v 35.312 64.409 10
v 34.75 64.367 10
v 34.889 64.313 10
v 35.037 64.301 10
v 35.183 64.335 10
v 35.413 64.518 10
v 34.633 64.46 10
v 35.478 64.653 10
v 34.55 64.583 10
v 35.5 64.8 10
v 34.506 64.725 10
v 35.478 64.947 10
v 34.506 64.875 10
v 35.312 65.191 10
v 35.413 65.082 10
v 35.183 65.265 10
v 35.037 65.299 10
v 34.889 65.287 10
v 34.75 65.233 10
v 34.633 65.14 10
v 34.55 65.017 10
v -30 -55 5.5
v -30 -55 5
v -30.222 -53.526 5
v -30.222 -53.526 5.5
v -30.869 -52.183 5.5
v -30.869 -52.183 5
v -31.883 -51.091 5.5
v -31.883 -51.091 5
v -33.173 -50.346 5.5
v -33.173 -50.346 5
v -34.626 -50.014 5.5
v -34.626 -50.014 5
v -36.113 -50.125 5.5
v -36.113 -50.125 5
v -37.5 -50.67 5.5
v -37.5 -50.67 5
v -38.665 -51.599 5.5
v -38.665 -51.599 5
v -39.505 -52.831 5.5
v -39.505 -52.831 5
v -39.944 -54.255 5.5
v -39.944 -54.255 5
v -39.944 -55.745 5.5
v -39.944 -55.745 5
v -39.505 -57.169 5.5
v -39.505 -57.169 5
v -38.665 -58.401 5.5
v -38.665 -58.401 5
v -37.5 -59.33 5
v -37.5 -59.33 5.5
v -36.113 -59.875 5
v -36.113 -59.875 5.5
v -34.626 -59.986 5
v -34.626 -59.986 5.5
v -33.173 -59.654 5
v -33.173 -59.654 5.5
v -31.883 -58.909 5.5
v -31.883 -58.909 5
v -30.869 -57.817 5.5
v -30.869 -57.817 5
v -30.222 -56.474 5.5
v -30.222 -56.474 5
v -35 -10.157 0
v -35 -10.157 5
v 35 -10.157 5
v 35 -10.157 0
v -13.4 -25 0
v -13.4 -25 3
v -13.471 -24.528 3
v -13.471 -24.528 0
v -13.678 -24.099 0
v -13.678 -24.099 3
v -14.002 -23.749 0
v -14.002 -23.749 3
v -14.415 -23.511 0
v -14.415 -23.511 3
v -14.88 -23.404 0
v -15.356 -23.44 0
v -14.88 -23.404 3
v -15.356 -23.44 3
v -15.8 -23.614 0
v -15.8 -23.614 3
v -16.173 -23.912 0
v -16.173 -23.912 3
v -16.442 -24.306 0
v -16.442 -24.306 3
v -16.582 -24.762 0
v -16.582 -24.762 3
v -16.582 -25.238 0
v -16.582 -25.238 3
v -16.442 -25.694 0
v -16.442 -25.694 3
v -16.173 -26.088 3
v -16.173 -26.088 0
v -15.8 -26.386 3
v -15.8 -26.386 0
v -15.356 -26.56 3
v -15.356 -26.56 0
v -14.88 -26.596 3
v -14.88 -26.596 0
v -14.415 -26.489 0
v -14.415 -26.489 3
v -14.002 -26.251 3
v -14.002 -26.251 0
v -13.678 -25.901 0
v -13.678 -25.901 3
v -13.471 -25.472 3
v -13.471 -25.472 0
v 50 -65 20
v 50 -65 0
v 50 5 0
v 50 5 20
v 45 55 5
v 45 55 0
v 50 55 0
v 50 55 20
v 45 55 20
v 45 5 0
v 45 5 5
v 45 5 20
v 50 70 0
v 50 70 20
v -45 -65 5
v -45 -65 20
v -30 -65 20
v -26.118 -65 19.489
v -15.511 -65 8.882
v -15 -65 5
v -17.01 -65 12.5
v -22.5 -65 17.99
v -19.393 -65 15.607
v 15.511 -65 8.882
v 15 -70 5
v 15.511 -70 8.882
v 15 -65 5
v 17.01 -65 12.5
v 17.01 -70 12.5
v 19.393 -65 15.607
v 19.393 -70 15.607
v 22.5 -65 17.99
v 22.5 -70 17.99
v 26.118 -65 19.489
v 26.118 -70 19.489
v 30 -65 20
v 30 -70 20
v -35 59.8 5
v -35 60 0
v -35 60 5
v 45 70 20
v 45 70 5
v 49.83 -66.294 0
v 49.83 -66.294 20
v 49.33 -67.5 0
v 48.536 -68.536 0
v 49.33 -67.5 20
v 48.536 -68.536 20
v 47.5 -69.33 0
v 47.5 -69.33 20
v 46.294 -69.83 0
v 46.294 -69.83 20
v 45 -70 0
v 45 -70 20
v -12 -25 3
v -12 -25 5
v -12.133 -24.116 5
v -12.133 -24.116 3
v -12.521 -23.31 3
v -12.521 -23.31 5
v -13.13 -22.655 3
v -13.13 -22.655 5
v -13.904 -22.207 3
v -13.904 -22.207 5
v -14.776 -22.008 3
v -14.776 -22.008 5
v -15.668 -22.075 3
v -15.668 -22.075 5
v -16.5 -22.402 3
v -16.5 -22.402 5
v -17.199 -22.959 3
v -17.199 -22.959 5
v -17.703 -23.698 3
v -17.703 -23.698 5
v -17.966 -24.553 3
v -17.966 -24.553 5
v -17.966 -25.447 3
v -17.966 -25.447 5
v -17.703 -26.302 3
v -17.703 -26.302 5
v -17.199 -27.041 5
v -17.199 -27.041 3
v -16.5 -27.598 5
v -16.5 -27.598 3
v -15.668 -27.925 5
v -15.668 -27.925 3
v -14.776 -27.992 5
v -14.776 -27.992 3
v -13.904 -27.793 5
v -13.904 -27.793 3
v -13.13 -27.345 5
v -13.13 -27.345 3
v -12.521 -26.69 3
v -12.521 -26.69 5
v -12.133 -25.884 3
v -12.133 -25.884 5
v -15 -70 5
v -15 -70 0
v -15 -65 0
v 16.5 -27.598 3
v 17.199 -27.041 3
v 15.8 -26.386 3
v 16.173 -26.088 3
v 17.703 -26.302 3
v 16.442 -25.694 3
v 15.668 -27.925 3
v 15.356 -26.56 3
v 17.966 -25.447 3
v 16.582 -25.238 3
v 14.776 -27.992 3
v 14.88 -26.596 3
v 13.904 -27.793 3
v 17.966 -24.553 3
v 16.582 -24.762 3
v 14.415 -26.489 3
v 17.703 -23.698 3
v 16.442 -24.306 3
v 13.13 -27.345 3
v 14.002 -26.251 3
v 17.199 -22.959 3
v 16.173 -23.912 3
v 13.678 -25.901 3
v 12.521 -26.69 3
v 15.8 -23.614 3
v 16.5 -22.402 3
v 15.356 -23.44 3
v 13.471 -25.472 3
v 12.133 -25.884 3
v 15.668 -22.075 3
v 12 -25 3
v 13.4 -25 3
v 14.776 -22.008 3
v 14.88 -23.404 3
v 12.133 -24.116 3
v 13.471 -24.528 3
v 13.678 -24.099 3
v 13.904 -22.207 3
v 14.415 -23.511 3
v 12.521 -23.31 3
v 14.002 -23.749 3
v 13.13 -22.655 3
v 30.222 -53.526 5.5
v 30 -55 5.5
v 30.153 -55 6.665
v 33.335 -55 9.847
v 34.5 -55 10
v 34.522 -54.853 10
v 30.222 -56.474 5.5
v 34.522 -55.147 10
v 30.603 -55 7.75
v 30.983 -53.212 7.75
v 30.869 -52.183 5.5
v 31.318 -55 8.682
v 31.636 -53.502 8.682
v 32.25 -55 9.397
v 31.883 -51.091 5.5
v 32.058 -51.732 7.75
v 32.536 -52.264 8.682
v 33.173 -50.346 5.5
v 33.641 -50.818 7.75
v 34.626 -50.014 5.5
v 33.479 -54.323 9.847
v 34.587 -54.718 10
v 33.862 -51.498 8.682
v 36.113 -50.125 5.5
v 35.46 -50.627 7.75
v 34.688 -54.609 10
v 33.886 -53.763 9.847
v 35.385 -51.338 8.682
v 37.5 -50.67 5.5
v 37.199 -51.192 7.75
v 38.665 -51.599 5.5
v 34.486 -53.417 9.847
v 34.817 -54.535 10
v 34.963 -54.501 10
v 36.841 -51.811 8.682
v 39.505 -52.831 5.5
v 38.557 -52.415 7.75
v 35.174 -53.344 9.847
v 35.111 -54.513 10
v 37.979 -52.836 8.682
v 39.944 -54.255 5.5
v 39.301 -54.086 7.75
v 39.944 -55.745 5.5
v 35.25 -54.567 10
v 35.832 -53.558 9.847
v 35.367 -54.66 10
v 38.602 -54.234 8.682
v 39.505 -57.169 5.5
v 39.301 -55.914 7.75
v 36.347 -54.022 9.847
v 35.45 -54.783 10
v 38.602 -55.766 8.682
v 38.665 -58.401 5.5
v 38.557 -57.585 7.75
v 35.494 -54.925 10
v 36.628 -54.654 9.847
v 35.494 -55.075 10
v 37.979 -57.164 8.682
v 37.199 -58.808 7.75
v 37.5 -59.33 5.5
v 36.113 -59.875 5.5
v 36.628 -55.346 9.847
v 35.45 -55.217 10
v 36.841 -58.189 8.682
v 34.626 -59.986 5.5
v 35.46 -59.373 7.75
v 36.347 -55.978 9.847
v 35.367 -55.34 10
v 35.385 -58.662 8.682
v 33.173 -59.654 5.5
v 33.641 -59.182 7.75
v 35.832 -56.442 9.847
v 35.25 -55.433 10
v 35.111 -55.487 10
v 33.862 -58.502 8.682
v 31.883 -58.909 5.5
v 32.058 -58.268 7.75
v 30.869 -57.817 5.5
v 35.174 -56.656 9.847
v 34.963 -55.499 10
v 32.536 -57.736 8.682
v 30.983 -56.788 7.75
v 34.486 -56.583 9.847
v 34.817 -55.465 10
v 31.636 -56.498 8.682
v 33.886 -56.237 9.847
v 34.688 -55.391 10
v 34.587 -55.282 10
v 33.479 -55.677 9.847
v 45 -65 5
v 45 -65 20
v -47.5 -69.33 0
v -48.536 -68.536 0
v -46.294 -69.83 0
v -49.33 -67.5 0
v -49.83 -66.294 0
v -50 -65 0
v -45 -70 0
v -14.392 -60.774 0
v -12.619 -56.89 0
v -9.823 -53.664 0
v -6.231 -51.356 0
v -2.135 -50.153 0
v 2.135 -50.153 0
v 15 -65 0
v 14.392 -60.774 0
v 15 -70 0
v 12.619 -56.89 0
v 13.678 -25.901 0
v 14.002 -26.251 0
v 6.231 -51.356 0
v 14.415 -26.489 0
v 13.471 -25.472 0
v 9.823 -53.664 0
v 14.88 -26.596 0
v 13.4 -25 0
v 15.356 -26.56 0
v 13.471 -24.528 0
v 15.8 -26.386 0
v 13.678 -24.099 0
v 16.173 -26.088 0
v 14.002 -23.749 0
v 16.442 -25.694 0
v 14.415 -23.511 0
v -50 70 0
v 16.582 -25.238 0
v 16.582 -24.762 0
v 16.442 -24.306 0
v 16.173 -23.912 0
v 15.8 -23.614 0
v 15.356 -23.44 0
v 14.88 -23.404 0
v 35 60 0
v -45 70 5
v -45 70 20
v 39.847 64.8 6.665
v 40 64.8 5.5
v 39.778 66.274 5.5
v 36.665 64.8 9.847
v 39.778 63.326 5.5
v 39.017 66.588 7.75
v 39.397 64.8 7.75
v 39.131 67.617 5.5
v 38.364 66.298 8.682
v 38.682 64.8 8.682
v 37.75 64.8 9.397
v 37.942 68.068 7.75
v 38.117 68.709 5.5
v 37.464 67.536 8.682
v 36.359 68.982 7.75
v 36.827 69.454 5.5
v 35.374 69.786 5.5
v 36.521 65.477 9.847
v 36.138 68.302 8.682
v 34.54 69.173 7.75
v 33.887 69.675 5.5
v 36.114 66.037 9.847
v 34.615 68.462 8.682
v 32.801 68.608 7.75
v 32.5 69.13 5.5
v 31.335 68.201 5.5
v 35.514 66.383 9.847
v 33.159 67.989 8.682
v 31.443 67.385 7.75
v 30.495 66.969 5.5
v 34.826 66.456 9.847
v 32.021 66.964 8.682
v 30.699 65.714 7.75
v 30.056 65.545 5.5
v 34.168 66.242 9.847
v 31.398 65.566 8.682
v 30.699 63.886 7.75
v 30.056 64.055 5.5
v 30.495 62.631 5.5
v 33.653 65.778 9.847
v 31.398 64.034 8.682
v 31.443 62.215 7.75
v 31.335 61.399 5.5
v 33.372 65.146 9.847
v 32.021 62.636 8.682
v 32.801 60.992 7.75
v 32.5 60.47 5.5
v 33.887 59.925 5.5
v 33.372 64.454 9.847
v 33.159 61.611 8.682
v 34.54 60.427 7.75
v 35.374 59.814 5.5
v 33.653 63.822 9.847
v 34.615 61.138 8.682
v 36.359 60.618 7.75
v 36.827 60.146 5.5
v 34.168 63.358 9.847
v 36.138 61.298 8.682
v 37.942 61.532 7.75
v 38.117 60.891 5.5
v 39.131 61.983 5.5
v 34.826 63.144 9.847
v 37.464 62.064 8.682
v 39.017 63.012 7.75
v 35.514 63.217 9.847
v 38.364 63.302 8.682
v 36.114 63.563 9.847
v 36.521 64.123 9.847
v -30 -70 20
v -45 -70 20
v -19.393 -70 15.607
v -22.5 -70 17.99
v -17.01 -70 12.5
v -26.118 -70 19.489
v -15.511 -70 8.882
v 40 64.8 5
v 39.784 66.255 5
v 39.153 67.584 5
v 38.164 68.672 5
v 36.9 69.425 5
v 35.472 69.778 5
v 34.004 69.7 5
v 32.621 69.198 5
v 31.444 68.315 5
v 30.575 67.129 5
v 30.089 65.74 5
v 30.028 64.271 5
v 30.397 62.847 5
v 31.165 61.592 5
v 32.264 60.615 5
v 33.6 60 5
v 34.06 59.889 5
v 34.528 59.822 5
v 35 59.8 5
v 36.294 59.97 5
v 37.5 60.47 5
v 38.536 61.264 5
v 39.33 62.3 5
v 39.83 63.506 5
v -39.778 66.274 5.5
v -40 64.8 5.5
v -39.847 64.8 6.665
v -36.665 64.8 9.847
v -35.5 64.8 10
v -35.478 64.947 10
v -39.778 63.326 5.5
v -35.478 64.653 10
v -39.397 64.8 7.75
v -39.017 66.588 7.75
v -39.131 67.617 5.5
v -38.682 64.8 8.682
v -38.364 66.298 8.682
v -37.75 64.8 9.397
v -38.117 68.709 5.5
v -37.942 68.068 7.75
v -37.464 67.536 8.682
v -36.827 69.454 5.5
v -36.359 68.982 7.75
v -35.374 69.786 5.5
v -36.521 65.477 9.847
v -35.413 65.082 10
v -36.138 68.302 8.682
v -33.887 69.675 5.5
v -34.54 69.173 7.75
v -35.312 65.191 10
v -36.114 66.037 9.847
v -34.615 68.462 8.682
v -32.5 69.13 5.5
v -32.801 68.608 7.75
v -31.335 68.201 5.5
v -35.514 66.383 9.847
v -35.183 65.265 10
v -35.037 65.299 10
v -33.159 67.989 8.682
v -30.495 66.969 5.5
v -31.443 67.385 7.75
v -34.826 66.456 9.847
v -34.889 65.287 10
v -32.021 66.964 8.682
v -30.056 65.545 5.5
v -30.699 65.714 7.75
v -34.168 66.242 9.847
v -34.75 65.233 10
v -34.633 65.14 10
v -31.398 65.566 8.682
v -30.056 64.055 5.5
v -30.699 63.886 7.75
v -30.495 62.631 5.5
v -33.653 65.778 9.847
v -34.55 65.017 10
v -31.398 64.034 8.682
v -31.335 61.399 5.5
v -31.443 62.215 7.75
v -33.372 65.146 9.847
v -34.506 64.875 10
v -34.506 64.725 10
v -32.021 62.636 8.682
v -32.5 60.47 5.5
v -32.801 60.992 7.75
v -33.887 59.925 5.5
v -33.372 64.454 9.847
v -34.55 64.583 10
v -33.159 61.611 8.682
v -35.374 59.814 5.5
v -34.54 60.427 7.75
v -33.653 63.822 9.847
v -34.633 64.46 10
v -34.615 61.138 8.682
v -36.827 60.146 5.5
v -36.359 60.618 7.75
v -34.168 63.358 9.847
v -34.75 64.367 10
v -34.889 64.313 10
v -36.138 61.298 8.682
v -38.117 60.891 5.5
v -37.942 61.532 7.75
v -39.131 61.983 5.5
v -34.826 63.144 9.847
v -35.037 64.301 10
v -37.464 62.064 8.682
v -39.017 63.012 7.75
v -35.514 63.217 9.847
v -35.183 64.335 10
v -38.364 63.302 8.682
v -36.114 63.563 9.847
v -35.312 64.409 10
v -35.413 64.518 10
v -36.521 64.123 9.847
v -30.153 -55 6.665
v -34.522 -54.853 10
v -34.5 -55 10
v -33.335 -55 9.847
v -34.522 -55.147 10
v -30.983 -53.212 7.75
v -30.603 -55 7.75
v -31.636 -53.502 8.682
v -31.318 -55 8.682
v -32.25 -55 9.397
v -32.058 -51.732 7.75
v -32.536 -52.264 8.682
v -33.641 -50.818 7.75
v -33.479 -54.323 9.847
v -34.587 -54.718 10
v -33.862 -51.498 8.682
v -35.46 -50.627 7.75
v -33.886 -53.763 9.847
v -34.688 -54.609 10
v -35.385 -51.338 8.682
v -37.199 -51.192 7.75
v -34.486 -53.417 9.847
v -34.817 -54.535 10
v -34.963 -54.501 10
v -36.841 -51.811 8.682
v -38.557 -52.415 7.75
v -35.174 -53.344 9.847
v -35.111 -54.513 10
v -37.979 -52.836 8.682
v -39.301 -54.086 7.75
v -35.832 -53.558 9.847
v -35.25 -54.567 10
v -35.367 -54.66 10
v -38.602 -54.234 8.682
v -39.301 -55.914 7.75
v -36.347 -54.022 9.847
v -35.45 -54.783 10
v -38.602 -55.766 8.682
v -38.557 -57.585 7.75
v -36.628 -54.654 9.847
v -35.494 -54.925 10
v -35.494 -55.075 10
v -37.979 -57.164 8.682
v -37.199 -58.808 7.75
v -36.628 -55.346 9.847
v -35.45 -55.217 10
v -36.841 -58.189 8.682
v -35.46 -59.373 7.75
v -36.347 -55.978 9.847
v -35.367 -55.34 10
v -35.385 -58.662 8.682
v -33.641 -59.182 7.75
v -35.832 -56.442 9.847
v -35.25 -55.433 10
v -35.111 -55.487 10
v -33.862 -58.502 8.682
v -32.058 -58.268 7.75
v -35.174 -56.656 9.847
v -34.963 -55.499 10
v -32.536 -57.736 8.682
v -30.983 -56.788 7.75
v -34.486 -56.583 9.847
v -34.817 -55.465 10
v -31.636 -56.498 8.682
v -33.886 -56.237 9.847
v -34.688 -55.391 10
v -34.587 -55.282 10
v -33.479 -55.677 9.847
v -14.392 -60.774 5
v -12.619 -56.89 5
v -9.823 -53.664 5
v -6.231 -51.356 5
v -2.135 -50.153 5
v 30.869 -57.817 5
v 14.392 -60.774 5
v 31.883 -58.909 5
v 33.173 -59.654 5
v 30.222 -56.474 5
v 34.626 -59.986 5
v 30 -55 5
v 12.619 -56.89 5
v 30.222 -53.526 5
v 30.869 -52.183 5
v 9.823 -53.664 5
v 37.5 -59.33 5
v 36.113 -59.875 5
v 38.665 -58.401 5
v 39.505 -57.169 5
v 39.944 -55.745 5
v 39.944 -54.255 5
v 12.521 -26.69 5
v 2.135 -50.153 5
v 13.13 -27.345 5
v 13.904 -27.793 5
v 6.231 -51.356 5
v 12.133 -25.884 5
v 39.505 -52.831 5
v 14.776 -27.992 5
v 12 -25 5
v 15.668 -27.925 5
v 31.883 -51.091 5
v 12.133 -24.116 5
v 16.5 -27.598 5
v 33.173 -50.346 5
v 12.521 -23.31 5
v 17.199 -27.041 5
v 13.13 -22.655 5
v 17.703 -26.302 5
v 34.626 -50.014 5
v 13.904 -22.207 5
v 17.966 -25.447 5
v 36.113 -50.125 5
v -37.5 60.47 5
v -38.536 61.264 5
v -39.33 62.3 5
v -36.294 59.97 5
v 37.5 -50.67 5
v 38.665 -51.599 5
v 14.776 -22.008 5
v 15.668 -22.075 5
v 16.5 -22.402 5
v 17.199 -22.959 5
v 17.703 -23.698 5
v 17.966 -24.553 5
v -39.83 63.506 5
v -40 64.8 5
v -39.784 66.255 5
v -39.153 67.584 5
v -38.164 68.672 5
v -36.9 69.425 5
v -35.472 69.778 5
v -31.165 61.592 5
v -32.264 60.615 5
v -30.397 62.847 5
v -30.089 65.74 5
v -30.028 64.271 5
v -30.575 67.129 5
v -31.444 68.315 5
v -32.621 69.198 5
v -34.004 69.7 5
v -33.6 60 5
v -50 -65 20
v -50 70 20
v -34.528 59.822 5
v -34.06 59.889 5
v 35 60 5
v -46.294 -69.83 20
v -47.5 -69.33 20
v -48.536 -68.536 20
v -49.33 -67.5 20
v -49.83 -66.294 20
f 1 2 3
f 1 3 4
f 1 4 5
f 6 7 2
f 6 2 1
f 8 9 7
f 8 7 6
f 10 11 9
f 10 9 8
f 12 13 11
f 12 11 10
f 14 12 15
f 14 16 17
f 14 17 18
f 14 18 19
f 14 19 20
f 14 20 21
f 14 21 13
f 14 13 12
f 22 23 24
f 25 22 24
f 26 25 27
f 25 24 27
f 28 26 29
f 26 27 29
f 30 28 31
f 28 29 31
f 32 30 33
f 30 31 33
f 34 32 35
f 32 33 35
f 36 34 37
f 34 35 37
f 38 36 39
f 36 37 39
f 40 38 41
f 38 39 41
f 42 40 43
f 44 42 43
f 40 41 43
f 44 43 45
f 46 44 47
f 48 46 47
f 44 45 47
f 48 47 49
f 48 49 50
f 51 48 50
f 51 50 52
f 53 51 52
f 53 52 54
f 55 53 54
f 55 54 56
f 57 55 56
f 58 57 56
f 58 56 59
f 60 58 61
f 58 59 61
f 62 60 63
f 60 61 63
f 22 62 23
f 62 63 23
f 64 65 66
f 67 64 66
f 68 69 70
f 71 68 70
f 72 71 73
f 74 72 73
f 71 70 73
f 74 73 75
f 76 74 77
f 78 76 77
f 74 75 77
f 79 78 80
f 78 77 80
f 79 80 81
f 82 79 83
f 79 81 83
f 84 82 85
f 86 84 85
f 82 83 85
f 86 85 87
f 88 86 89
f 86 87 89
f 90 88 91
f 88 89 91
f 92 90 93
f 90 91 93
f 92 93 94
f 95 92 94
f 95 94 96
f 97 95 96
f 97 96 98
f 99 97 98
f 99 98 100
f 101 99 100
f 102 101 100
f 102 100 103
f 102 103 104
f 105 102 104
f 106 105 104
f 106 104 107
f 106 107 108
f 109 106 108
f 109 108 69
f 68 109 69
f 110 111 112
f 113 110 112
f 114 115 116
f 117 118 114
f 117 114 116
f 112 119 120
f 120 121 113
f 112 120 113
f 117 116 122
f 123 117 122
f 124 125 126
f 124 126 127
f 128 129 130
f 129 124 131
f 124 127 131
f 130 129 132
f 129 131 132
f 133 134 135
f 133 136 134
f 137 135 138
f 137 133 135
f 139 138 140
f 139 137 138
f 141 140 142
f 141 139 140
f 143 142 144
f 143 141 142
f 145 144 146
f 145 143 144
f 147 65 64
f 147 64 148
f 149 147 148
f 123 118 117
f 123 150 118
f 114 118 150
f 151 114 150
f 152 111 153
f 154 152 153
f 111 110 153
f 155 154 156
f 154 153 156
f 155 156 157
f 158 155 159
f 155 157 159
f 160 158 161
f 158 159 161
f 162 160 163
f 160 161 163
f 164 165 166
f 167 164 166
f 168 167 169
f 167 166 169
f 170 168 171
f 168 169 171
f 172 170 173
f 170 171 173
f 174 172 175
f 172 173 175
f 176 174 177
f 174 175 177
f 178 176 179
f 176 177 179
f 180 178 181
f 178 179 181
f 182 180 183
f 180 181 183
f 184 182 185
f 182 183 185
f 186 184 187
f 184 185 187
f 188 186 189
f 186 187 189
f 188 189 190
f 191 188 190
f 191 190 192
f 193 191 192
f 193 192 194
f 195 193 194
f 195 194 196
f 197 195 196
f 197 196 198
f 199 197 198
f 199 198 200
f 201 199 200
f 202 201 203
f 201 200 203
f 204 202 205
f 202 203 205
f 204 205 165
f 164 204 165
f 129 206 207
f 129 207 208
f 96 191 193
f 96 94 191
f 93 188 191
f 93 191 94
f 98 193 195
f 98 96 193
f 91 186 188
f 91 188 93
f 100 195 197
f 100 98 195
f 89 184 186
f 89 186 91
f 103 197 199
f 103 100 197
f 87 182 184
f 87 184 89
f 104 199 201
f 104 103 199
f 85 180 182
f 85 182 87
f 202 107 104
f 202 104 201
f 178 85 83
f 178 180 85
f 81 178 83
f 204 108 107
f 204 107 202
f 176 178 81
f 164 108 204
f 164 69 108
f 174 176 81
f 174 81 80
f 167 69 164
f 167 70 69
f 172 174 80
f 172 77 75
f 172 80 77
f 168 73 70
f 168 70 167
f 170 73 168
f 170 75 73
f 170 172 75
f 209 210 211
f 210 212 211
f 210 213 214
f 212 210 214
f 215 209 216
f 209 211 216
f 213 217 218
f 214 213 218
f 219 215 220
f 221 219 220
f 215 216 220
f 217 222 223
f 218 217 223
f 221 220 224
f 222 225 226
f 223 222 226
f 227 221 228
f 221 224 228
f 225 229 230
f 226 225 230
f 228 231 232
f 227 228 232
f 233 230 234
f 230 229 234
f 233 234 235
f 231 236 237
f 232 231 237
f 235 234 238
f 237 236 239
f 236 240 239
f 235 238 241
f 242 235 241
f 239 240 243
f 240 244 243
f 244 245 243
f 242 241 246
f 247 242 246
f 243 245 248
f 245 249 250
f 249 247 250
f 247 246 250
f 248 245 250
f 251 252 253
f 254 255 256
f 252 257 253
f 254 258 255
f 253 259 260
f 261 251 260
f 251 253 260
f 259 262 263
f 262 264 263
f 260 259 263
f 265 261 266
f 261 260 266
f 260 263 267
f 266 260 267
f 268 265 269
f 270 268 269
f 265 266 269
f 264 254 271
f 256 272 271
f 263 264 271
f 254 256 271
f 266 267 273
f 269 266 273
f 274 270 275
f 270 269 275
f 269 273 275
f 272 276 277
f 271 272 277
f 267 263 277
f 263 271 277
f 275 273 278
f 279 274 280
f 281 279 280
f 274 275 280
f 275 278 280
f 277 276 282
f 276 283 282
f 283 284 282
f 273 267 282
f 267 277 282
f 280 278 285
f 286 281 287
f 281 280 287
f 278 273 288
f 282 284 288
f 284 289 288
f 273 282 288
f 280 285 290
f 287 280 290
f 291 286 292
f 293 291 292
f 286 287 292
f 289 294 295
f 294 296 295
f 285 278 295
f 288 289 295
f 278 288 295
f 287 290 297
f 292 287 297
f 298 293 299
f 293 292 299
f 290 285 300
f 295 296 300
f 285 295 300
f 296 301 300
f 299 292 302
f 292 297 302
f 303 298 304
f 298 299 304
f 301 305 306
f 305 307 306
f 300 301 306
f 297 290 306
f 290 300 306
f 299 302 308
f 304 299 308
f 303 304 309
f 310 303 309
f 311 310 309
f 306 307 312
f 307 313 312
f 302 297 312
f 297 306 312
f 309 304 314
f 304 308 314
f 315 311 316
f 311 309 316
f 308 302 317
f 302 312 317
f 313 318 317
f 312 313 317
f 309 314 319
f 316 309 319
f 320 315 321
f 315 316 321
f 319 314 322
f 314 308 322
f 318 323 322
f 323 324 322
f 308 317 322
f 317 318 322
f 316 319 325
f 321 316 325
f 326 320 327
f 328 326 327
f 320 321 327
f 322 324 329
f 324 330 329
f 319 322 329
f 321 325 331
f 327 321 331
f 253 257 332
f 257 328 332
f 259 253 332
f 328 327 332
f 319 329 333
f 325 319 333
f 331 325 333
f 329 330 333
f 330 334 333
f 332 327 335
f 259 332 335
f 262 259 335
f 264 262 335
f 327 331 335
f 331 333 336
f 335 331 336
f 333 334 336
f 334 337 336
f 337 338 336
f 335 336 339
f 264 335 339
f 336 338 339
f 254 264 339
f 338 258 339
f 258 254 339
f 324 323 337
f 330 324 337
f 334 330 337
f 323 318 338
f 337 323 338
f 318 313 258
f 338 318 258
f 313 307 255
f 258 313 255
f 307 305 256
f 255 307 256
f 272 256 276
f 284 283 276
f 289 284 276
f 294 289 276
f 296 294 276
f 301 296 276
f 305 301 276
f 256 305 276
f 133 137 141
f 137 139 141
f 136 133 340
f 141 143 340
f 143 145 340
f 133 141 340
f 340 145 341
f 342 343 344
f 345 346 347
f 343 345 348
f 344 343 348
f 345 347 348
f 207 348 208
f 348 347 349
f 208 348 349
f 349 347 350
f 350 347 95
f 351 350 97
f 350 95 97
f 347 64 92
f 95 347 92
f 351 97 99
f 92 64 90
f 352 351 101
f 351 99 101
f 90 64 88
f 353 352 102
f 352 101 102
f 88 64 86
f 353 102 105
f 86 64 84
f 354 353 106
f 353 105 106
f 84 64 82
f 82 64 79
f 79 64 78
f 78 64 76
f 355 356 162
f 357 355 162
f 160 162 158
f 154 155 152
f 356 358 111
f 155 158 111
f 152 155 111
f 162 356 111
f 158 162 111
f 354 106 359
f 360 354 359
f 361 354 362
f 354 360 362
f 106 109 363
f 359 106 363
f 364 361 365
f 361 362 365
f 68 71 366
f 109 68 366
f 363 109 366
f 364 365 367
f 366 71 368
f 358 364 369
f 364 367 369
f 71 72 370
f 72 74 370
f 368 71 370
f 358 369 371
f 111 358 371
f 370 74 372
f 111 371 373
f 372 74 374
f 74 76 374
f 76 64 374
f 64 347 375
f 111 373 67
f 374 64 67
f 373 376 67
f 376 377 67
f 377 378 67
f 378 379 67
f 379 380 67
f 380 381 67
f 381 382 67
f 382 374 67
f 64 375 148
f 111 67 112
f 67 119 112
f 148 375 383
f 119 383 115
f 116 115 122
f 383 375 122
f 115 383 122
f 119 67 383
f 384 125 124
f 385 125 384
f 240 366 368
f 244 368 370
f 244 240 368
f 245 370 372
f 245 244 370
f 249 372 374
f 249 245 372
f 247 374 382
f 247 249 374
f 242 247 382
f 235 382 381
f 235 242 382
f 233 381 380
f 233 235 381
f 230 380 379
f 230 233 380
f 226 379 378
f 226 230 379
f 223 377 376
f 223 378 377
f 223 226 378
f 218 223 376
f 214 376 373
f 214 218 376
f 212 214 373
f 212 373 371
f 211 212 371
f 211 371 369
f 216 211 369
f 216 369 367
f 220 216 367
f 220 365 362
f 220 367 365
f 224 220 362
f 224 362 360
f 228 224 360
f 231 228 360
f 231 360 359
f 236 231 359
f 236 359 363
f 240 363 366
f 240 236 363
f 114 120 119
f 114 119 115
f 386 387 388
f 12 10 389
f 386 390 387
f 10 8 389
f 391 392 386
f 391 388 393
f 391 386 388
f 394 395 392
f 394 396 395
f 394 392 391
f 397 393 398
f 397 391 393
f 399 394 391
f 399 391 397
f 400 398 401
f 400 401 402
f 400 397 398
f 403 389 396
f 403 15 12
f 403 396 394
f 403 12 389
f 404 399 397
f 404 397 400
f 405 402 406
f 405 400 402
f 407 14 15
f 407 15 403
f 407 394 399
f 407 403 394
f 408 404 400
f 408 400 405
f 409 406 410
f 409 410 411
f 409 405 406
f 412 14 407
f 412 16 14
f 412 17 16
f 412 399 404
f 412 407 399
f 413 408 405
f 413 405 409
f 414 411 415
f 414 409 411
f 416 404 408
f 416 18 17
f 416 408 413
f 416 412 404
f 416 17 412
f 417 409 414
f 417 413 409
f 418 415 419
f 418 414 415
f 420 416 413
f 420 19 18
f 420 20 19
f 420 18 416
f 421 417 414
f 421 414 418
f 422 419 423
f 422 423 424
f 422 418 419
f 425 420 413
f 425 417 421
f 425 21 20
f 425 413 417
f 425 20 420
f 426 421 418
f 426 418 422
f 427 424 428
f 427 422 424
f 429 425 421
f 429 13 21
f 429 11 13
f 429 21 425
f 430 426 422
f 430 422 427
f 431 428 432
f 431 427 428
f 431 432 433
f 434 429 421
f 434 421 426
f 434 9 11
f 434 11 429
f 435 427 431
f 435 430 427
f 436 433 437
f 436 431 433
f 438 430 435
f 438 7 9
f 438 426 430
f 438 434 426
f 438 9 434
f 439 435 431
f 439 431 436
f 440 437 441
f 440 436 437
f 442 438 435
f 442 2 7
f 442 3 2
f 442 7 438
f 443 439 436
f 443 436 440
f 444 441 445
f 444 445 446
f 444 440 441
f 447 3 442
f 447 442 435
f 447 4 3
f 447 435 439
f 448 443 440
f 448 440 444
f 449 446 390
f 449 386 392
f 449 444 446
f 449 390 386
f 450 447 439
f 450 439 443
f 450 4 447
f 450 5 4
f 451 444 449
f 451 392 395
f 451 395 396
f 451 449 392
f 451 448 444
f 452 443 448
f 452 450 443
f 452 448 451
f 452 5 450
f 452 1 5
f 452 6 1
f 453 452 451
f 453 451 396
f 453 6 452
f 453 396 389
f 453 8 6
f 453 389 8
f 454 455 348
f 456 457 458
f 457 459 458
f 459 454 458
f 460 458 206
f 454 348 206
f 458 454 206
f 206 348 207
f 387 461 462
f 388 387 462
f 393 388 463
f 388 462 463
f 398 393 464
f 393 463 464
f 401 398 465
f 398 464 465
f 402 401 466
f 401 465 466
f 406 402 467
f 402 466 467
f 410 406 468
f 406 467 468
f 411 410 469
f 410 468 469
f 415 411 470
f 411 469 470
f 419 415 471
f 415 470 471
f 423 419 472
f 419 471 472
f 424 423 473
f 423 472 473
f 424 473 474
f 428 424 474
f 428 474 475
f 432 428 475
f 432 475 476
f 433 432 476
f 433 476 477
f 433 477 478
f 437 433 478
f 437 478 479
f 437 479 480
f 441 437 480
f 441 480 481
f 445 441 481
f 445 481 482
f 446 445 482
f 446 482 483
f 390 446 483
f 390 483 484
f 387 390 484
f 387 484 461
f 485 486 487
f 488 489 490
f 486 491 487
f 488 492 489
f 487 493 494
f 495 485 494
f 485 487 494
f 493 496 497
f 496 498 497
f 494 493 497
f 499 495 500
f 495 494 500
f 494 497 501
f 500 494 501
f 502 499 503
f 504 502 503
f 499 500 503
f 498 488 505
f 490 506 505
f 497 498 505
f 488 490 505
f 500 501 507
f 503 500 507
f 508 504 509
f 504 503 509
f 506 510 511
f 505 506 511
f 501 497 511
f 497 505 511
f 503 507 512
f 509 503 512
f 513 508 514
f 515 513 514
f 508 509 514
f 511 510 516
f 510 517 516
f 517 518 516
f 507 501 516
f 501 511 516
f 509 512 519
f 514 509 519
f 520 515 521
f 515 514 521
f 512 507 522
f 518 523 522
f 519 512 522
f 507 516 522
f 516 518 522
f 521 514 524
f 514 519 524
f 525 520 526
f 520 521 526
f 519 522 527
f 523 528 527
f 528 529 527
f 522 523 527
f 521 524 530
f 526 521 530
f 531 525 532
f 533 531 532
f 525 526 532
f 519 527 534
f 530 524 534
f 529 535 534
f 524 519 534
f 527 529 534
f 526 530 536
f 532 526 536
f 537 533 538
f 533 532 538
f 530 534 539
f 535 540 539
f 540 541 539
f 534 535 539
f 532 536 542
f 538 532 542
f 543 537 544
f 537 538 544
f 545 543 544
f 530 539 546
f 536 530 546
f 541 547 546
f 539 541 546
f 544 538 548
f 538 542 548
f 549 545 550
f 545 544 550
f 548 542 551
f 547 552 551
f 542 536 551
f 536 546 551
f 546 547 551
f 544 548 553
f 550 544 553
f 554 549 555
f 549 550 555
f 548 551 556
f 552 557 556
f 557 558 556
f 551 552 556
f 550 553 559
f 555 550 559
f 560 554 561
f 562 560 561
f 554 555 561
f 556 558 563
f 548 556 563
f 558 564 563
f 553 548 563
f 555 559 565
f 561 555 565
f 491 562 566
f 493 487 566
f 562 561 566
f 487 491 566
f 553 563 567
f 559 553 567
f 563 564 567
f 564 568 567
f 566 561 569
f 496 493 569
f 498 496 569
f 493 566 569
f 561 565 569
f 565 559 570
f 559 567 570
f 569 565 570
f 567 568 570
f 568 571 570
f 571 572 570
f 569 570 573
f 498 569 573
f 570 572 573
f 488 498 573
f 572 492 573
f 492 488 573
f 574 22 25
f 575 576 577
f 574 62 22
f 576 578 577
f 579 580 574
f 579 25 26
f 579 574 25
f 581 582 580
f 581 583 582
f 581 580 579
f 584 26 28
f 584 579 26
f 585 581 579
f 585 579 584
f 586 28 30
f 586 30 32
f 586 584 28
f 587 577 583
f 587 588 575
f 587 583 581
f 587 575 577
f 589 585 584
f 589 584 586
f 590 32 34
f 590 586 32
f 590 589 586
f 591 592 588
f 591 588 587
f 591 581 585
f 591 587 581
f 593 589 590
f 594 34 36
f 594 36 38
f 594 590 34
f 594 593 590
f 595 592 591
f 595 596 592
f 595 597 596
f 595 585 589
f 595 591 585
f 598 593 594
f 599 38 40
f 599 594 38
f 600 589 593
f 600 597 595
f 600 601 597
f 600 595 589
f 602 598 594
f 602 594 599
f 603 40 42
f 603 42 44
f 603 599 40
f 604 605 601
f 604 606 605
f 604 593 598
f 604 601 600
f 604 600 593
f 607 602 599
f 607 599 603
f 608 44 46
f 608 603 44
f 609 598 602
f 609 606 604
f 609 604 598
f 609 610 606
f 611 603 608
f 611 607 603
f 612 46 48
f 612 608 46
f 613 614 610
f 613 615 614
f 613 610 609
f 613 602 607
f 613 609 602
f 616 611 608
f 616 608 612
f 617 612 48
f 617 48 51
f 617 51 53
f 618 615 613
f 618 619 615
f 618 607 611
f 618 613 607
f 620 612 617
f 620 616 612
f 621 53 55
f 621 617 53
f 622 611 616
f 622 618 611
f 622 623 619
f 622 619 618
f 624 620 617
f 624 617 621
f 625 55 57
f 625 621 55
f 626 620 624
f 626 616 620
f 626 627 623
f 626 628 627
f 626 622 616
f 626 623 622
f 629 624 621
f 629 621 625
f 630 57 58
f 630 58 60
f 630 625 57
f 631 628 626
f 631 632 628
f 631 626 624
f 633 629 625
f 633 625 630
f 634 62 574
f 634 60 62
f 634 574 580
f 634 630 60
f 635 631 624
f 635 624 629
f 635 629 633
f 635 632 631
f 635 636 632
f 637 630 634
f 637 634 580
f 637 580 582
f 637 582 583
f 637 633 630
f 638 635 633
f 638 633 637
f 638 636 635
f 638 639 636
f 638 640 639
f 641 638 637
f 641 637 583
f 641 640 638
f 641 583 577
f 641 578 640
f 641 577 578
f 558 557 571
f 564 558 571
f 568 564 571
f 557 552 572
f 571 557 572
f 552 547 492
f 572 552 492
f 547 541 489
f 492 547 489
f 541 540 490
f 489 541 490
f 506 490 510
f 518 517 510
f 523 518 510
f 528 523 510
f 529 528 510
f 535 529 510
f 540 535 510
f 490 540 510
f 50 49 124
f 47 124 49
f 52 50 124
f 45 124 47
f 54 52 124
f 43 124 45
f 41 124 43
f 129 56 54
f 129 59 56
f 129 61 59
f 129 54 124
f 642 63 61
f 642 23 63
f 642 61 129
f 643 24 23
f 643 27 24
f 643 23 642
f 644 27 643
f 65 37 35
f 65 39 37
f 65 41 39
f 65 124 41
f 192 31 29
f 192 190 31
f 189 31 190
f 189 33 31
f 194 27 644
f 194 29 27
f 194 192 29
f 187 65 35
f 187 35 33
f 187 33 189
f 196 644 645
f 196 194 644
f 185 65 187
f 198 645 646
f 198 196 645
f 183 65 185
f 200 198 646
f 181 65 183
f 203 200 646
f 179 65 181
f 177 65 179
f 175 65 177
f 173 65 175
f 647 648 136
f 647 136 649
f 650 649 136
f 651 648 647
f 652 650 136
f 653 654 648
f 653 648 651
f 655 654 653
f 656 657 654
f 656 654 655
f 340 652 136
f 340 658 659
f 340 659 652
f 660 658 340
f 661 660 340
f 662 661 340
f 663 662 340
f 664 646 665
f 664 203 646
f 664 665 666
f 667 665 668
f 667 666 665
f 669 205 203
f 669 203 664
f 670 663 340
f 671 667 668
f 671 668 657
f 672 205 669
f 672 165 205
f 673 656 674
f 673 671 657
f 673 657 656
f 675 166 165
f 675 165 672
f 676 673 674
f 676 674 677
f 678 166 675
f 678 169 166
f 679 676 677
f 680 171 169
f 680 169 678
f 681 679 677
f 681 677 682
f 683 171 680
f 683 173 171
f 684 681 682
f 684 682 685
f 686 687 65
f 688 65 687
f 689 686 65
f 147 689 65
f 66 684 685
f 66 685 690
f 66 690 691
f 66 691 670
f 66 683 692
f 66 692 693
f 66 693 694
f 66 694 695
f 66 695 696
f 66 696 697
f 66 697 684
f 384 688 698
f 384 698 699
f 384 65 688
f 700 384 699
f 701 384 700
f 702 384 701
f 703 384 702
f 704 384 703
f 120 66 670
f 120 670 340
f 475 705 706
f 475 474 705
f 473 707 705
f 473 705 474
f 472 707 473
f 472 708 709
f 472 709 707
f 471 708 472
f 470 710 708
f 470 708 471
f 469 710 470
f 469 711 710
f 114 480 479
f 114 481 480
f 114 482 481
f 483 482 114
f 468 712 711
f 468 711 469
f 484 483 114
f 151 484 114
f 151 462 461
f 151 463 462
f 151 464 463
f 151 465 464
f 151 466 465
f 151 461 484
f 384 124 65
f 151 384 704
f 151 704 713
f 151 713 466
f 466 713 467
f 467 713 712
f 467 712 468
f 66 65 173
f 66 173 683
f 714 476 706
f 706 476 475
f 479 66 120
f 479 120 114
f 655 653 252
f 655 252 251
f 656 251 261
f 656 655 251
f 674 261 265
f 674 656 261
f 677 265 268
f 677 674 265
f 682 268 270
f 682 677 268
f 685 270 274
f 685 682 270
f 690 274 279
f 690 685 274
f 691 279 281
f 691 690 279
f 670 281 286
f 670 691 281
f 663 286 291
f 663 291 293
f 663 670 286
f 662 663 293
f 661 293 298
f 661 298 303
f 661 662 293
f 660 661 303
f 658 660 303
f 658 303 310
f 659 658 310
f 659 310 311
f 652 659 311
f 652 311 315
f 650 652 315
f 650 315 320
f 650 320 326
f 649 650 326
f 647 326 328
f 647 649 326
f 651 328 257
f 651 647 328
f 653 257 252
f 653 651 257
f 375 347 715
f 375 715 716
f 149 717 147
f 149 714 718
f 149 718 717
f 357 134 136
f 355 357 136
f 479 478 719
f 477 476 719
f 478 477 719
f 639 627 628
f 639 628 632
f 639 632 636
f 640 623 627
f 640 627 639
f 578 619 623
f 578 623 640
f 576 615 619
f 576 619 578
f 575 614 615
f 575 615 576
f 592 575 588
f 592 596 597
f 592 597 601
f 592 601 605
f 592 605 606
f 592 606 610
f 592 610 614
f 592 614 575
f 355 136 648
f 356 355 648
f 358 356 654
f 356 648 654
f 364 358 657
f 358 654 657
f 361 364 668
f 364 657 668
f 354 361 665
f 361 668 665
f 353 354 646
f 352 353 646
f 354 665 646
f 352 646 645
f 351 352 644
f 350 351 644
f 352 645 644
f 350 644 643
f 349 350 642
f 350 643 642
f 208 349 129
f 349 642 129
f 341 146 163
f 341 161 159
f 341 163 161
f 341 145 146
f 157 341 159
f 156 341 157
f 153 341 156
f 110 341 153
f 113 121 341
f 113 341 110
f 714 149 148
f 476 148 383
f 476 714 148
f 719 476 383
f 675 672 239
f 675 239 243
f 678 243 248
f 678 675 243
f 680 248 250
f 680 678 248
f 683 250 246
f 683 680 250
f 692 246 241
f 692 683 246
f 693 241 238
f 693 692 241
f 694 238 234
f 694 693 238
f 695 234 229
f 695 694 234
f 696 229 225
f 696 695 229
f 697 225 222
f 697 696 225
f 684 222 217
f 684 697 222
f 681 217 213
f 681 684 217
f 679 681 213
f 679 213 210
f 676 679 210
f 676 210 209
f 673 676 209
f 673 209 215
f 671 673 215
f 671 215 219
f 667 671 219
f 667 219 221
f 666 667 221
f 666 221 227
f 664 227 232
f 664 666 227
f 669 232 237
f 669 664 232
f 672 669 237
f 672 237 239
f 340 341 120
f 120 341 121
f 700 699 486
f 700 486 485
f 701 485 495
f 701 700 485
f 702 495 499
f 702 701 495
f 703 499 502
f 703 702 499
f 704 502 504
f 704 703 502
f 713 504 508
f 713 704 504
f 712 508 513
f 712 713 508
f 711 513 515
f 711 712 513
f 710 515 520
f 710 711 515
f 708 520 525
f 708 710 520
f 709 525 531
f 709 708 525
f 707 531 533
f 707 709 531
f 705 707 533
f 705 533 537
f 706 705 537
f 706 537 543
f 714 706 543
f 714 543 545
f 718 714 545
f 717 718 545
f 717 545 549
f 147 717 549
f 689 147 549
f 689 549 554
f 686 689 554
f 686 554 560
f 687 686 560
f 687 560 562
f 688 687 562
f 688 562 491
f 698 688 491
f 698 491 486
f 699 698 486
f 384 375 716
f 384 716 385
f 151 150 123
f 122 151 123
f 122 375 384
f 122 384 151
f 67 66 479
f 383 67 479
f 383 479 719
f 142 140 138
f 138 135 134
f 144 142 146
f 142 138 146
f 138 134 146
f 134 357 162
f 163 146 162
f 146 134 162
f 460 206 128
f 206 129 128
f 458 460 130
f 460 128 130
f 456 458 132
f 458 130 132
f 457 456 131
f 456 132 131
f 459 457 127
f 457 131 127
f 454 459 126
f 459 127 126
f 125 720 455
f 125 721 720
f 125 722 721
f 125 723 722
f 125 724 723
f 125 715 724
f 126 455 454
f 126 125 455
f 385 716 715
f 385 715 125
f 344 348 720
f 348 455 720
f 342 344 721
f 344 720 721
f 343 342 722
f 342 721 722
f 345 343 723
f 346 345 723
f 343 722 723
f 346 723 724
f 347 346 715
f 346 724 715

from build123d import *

# Parameters (mm, degrees)
SKETCH_W        = 100
SKETCH_H        = 140
PAD_DEPTH       = 20
SKETCH001_W     = 90
SKETCH001_H     = 135
POCKET_DEPTH    = 15
SKETCH003_R     = 3
POCKET001_DEPTH = 2
SKETCH004_R     = 1.6
POCKET002_DEPTH = 349.411162
SKETCH005_W     = 5
SKETCH005_H     = 50
POCKET003_DEPTH = 20.001
SKETCH006_W     = 30
SKETCH006_H     = 5
POCKET004_DEPTH = 20.001
SKETCH007_W     = 70
SKETCH007_H     = 70.156743
POCKET005_DEPTH = 5.001
SKETCH008_R     = 15
POCKET006_DEPTH = 5.001
FILLET_R        = 5
FILLET001_R     = 5
FILLET002_R     = 15
FILLET003_R     = 15
SKETCH009_R     = 5
PAD001_DEPTH    = 5
SKETCH010_R     = 5
PAD002_DEPTH    = 5
FILLET004_R     = 4.5
FILLET005_R     = 4.5
FILLET006_R     = 4.5
FILLET007_R     = 4.5


with BuildPart() as part:
    # Sketch → Pad (new body)
    with BuildSketch(Plane.XY):
        Rectangle(SKETCH_W, SKETCH_H)
    extrude(amount=PAD_DEPTH)

    # Sketch001 → Pocket (cut)
    with BuildSketch(Plane.XY.offset(20)):
        with Locations((0, 2.5)):
            Rectangle(SKETCH001_W, SKETCH001_H)
    extrude(amount=-POCKET_DEPTH, mode=Mode.SUBTRACT)

    # Sketch003 → Pocket001 (cut)
    with BuildSketch(Plane.XY.offset(5)):
        with Locations((-15, -25)):
            Circle(SKETCH003_R)
    pocket001 = extrude(amount=-POCKET001_DEPTH, mode=Mode.SUBTRACT)

    # Sketch004 → Pocket002 (cut, through all)
    with BuildSketch(Plane.XY.offset(3)):
        with Locations((-15, -25)):
            Circle(SKETCH004_R)
    pocket002 = extrude(amount=-POCKET002_DEPTH, mode=Mode.SUBTRACT)

    # Mirrored: Pocket002, Pocket001 across Sketch004 V_Axis
    add(pocket002.mirror(Plane(origin=(0, 0, 3), x_dir=(0, 0, 1), z_dir=(1, 0, 0))), mode=Mode.SUBTRACT)
    add(pocket001.mirror(Plane(origin=(0, 0, 3), x_dir=(0, 0, 1), z_dir=(1, 0, 0))), mode=Mode.SUBTRACT)

    # Sketch005 → Pocket003 (cut, through all)
    with BuildSketch(Plane.XY.offset(20)):
        with Locations((47.5, 30)):
            Rectangle(SKETCH005_W, SKETCH005_H)
    extrude(amount=-POCKET003_DEPTH, mode=Mode.SUBTRACT)

    # Sketch006 → Pocket004 (cut, through all)
    with BuildSketch(Plane.XY.offset(20)):
        with Locations((0, -67.5)):
            Rectangle(SKETCH006_W, SKETCH006_H)
    extrude(amount=-POCKET004_DEPTH, mode=Mode.SUBTRACT)

    # Sketch007 → Pocket005 (cut, through all)
    with BuildSketch(Plane.XY.offset(5)):
        with Locations((0, 24.921629)):
            Rectangle(SKETCH007_W, SKETCH007_H)
    extrude(amount=-POCKET005_DEPTH, mode=Mode.SUBTRACT)

    # Sketch008 → Pocket006 (cut, through all)
    with BuildSketch(Plane.XY.offset(5)):
        with Locations((0, -65)):
            Circle(SKETCH008_R)
    extrude(amount=-POCKET006_DEPTH, mode=Mode.SUBTRACT)

    # Fillet
    fillet_edges = [part.edges().sort_by_distance(p)[0] for p in [
        (50, -70, 10),
    ]]
    fillet(fillet_edges, radius=FILLET_R)

    # Fillet001
    fillet001_edges = [part.edges().sort_by_distance(p)[0] for p in [
        (-50, -70, 10),
    ]]
    fillet(fillet001_edges, radius=FILLET001_R)

    # Fillet002
    fillet002_edges = [part.edges().sort_by_distance(p)[0] for p in [
        (-15, -67.5, 20),
    ]]
    fillet(fillet002_edges, radius=FILLET002_R)

    # Fillet003
    fillet003_edges = [part.edges().sort_by_distance(p)[0] for p in [
        (15, -67.5, 20),
    ]]
    fillet(fillet003_edges, radius=FILLET003_R)

    # Sketch009 → Pad001 (new body)
    with BuildSketch(Plane.XY.offset(5)):
        with Locations((35, 64.8)):
            Circle(SKETCH009_R)
    pad001 = extrude(amount=PAD001_DEPTH)

    # Mirrored001: Pad001 across Sketch009 V_Axis
    add(pad001.mirror(Plane(origin=(0, 0, 5), x_dir=(0, 0, 1), z_dir=(1, 0, 0))))

    # Sketch010 → Pad002 (new body)
    with BuildSketch(Plane.XY.offset(5)):
        with Locations((-35, -55)):
            Circle(SKETCH010_R)
    pad002 = extrude(amount=PAD002_DEPTH)

    # Mirrored002: Pad002 across Sketch010 V_Axis
    add(pad002.mirror(Plane(origin=(0, 0, 5), x_dir=(0, 0, 1), z_dir=(1, 0, 0))))

    # Fillet004
    fillet004_edges = [part.edges().sort_by_distance(p)[0] for p in [
        (-40, -55, 10),
    ]]
    fillet(fillet004_edges, radius=FILLET004_R)

    # Fillet005
    fillet005_edges = [part.edges().sort_by_distance(p)[0] for p in [
        (40, -55, 10),
    ]]
    fillet(fillet005_edges, radius=FILLET005_R)

    # Fillet006
    fillet006_edges = [part.edges().sort_by_distance(p)[0] for p in [
        (30, 64.8, 10),
    ]]
    fillet(fillet006_edges, radius=FILLET006_R)

    # Fillet007
    fillet007_edges = [part.edges().sort_by_distance(p)[0] for p in [
        (-30, 64.8, 10),
    ]]
    fillet(fillet007_edges, radius=FILLET007_R)


solid = part.part
